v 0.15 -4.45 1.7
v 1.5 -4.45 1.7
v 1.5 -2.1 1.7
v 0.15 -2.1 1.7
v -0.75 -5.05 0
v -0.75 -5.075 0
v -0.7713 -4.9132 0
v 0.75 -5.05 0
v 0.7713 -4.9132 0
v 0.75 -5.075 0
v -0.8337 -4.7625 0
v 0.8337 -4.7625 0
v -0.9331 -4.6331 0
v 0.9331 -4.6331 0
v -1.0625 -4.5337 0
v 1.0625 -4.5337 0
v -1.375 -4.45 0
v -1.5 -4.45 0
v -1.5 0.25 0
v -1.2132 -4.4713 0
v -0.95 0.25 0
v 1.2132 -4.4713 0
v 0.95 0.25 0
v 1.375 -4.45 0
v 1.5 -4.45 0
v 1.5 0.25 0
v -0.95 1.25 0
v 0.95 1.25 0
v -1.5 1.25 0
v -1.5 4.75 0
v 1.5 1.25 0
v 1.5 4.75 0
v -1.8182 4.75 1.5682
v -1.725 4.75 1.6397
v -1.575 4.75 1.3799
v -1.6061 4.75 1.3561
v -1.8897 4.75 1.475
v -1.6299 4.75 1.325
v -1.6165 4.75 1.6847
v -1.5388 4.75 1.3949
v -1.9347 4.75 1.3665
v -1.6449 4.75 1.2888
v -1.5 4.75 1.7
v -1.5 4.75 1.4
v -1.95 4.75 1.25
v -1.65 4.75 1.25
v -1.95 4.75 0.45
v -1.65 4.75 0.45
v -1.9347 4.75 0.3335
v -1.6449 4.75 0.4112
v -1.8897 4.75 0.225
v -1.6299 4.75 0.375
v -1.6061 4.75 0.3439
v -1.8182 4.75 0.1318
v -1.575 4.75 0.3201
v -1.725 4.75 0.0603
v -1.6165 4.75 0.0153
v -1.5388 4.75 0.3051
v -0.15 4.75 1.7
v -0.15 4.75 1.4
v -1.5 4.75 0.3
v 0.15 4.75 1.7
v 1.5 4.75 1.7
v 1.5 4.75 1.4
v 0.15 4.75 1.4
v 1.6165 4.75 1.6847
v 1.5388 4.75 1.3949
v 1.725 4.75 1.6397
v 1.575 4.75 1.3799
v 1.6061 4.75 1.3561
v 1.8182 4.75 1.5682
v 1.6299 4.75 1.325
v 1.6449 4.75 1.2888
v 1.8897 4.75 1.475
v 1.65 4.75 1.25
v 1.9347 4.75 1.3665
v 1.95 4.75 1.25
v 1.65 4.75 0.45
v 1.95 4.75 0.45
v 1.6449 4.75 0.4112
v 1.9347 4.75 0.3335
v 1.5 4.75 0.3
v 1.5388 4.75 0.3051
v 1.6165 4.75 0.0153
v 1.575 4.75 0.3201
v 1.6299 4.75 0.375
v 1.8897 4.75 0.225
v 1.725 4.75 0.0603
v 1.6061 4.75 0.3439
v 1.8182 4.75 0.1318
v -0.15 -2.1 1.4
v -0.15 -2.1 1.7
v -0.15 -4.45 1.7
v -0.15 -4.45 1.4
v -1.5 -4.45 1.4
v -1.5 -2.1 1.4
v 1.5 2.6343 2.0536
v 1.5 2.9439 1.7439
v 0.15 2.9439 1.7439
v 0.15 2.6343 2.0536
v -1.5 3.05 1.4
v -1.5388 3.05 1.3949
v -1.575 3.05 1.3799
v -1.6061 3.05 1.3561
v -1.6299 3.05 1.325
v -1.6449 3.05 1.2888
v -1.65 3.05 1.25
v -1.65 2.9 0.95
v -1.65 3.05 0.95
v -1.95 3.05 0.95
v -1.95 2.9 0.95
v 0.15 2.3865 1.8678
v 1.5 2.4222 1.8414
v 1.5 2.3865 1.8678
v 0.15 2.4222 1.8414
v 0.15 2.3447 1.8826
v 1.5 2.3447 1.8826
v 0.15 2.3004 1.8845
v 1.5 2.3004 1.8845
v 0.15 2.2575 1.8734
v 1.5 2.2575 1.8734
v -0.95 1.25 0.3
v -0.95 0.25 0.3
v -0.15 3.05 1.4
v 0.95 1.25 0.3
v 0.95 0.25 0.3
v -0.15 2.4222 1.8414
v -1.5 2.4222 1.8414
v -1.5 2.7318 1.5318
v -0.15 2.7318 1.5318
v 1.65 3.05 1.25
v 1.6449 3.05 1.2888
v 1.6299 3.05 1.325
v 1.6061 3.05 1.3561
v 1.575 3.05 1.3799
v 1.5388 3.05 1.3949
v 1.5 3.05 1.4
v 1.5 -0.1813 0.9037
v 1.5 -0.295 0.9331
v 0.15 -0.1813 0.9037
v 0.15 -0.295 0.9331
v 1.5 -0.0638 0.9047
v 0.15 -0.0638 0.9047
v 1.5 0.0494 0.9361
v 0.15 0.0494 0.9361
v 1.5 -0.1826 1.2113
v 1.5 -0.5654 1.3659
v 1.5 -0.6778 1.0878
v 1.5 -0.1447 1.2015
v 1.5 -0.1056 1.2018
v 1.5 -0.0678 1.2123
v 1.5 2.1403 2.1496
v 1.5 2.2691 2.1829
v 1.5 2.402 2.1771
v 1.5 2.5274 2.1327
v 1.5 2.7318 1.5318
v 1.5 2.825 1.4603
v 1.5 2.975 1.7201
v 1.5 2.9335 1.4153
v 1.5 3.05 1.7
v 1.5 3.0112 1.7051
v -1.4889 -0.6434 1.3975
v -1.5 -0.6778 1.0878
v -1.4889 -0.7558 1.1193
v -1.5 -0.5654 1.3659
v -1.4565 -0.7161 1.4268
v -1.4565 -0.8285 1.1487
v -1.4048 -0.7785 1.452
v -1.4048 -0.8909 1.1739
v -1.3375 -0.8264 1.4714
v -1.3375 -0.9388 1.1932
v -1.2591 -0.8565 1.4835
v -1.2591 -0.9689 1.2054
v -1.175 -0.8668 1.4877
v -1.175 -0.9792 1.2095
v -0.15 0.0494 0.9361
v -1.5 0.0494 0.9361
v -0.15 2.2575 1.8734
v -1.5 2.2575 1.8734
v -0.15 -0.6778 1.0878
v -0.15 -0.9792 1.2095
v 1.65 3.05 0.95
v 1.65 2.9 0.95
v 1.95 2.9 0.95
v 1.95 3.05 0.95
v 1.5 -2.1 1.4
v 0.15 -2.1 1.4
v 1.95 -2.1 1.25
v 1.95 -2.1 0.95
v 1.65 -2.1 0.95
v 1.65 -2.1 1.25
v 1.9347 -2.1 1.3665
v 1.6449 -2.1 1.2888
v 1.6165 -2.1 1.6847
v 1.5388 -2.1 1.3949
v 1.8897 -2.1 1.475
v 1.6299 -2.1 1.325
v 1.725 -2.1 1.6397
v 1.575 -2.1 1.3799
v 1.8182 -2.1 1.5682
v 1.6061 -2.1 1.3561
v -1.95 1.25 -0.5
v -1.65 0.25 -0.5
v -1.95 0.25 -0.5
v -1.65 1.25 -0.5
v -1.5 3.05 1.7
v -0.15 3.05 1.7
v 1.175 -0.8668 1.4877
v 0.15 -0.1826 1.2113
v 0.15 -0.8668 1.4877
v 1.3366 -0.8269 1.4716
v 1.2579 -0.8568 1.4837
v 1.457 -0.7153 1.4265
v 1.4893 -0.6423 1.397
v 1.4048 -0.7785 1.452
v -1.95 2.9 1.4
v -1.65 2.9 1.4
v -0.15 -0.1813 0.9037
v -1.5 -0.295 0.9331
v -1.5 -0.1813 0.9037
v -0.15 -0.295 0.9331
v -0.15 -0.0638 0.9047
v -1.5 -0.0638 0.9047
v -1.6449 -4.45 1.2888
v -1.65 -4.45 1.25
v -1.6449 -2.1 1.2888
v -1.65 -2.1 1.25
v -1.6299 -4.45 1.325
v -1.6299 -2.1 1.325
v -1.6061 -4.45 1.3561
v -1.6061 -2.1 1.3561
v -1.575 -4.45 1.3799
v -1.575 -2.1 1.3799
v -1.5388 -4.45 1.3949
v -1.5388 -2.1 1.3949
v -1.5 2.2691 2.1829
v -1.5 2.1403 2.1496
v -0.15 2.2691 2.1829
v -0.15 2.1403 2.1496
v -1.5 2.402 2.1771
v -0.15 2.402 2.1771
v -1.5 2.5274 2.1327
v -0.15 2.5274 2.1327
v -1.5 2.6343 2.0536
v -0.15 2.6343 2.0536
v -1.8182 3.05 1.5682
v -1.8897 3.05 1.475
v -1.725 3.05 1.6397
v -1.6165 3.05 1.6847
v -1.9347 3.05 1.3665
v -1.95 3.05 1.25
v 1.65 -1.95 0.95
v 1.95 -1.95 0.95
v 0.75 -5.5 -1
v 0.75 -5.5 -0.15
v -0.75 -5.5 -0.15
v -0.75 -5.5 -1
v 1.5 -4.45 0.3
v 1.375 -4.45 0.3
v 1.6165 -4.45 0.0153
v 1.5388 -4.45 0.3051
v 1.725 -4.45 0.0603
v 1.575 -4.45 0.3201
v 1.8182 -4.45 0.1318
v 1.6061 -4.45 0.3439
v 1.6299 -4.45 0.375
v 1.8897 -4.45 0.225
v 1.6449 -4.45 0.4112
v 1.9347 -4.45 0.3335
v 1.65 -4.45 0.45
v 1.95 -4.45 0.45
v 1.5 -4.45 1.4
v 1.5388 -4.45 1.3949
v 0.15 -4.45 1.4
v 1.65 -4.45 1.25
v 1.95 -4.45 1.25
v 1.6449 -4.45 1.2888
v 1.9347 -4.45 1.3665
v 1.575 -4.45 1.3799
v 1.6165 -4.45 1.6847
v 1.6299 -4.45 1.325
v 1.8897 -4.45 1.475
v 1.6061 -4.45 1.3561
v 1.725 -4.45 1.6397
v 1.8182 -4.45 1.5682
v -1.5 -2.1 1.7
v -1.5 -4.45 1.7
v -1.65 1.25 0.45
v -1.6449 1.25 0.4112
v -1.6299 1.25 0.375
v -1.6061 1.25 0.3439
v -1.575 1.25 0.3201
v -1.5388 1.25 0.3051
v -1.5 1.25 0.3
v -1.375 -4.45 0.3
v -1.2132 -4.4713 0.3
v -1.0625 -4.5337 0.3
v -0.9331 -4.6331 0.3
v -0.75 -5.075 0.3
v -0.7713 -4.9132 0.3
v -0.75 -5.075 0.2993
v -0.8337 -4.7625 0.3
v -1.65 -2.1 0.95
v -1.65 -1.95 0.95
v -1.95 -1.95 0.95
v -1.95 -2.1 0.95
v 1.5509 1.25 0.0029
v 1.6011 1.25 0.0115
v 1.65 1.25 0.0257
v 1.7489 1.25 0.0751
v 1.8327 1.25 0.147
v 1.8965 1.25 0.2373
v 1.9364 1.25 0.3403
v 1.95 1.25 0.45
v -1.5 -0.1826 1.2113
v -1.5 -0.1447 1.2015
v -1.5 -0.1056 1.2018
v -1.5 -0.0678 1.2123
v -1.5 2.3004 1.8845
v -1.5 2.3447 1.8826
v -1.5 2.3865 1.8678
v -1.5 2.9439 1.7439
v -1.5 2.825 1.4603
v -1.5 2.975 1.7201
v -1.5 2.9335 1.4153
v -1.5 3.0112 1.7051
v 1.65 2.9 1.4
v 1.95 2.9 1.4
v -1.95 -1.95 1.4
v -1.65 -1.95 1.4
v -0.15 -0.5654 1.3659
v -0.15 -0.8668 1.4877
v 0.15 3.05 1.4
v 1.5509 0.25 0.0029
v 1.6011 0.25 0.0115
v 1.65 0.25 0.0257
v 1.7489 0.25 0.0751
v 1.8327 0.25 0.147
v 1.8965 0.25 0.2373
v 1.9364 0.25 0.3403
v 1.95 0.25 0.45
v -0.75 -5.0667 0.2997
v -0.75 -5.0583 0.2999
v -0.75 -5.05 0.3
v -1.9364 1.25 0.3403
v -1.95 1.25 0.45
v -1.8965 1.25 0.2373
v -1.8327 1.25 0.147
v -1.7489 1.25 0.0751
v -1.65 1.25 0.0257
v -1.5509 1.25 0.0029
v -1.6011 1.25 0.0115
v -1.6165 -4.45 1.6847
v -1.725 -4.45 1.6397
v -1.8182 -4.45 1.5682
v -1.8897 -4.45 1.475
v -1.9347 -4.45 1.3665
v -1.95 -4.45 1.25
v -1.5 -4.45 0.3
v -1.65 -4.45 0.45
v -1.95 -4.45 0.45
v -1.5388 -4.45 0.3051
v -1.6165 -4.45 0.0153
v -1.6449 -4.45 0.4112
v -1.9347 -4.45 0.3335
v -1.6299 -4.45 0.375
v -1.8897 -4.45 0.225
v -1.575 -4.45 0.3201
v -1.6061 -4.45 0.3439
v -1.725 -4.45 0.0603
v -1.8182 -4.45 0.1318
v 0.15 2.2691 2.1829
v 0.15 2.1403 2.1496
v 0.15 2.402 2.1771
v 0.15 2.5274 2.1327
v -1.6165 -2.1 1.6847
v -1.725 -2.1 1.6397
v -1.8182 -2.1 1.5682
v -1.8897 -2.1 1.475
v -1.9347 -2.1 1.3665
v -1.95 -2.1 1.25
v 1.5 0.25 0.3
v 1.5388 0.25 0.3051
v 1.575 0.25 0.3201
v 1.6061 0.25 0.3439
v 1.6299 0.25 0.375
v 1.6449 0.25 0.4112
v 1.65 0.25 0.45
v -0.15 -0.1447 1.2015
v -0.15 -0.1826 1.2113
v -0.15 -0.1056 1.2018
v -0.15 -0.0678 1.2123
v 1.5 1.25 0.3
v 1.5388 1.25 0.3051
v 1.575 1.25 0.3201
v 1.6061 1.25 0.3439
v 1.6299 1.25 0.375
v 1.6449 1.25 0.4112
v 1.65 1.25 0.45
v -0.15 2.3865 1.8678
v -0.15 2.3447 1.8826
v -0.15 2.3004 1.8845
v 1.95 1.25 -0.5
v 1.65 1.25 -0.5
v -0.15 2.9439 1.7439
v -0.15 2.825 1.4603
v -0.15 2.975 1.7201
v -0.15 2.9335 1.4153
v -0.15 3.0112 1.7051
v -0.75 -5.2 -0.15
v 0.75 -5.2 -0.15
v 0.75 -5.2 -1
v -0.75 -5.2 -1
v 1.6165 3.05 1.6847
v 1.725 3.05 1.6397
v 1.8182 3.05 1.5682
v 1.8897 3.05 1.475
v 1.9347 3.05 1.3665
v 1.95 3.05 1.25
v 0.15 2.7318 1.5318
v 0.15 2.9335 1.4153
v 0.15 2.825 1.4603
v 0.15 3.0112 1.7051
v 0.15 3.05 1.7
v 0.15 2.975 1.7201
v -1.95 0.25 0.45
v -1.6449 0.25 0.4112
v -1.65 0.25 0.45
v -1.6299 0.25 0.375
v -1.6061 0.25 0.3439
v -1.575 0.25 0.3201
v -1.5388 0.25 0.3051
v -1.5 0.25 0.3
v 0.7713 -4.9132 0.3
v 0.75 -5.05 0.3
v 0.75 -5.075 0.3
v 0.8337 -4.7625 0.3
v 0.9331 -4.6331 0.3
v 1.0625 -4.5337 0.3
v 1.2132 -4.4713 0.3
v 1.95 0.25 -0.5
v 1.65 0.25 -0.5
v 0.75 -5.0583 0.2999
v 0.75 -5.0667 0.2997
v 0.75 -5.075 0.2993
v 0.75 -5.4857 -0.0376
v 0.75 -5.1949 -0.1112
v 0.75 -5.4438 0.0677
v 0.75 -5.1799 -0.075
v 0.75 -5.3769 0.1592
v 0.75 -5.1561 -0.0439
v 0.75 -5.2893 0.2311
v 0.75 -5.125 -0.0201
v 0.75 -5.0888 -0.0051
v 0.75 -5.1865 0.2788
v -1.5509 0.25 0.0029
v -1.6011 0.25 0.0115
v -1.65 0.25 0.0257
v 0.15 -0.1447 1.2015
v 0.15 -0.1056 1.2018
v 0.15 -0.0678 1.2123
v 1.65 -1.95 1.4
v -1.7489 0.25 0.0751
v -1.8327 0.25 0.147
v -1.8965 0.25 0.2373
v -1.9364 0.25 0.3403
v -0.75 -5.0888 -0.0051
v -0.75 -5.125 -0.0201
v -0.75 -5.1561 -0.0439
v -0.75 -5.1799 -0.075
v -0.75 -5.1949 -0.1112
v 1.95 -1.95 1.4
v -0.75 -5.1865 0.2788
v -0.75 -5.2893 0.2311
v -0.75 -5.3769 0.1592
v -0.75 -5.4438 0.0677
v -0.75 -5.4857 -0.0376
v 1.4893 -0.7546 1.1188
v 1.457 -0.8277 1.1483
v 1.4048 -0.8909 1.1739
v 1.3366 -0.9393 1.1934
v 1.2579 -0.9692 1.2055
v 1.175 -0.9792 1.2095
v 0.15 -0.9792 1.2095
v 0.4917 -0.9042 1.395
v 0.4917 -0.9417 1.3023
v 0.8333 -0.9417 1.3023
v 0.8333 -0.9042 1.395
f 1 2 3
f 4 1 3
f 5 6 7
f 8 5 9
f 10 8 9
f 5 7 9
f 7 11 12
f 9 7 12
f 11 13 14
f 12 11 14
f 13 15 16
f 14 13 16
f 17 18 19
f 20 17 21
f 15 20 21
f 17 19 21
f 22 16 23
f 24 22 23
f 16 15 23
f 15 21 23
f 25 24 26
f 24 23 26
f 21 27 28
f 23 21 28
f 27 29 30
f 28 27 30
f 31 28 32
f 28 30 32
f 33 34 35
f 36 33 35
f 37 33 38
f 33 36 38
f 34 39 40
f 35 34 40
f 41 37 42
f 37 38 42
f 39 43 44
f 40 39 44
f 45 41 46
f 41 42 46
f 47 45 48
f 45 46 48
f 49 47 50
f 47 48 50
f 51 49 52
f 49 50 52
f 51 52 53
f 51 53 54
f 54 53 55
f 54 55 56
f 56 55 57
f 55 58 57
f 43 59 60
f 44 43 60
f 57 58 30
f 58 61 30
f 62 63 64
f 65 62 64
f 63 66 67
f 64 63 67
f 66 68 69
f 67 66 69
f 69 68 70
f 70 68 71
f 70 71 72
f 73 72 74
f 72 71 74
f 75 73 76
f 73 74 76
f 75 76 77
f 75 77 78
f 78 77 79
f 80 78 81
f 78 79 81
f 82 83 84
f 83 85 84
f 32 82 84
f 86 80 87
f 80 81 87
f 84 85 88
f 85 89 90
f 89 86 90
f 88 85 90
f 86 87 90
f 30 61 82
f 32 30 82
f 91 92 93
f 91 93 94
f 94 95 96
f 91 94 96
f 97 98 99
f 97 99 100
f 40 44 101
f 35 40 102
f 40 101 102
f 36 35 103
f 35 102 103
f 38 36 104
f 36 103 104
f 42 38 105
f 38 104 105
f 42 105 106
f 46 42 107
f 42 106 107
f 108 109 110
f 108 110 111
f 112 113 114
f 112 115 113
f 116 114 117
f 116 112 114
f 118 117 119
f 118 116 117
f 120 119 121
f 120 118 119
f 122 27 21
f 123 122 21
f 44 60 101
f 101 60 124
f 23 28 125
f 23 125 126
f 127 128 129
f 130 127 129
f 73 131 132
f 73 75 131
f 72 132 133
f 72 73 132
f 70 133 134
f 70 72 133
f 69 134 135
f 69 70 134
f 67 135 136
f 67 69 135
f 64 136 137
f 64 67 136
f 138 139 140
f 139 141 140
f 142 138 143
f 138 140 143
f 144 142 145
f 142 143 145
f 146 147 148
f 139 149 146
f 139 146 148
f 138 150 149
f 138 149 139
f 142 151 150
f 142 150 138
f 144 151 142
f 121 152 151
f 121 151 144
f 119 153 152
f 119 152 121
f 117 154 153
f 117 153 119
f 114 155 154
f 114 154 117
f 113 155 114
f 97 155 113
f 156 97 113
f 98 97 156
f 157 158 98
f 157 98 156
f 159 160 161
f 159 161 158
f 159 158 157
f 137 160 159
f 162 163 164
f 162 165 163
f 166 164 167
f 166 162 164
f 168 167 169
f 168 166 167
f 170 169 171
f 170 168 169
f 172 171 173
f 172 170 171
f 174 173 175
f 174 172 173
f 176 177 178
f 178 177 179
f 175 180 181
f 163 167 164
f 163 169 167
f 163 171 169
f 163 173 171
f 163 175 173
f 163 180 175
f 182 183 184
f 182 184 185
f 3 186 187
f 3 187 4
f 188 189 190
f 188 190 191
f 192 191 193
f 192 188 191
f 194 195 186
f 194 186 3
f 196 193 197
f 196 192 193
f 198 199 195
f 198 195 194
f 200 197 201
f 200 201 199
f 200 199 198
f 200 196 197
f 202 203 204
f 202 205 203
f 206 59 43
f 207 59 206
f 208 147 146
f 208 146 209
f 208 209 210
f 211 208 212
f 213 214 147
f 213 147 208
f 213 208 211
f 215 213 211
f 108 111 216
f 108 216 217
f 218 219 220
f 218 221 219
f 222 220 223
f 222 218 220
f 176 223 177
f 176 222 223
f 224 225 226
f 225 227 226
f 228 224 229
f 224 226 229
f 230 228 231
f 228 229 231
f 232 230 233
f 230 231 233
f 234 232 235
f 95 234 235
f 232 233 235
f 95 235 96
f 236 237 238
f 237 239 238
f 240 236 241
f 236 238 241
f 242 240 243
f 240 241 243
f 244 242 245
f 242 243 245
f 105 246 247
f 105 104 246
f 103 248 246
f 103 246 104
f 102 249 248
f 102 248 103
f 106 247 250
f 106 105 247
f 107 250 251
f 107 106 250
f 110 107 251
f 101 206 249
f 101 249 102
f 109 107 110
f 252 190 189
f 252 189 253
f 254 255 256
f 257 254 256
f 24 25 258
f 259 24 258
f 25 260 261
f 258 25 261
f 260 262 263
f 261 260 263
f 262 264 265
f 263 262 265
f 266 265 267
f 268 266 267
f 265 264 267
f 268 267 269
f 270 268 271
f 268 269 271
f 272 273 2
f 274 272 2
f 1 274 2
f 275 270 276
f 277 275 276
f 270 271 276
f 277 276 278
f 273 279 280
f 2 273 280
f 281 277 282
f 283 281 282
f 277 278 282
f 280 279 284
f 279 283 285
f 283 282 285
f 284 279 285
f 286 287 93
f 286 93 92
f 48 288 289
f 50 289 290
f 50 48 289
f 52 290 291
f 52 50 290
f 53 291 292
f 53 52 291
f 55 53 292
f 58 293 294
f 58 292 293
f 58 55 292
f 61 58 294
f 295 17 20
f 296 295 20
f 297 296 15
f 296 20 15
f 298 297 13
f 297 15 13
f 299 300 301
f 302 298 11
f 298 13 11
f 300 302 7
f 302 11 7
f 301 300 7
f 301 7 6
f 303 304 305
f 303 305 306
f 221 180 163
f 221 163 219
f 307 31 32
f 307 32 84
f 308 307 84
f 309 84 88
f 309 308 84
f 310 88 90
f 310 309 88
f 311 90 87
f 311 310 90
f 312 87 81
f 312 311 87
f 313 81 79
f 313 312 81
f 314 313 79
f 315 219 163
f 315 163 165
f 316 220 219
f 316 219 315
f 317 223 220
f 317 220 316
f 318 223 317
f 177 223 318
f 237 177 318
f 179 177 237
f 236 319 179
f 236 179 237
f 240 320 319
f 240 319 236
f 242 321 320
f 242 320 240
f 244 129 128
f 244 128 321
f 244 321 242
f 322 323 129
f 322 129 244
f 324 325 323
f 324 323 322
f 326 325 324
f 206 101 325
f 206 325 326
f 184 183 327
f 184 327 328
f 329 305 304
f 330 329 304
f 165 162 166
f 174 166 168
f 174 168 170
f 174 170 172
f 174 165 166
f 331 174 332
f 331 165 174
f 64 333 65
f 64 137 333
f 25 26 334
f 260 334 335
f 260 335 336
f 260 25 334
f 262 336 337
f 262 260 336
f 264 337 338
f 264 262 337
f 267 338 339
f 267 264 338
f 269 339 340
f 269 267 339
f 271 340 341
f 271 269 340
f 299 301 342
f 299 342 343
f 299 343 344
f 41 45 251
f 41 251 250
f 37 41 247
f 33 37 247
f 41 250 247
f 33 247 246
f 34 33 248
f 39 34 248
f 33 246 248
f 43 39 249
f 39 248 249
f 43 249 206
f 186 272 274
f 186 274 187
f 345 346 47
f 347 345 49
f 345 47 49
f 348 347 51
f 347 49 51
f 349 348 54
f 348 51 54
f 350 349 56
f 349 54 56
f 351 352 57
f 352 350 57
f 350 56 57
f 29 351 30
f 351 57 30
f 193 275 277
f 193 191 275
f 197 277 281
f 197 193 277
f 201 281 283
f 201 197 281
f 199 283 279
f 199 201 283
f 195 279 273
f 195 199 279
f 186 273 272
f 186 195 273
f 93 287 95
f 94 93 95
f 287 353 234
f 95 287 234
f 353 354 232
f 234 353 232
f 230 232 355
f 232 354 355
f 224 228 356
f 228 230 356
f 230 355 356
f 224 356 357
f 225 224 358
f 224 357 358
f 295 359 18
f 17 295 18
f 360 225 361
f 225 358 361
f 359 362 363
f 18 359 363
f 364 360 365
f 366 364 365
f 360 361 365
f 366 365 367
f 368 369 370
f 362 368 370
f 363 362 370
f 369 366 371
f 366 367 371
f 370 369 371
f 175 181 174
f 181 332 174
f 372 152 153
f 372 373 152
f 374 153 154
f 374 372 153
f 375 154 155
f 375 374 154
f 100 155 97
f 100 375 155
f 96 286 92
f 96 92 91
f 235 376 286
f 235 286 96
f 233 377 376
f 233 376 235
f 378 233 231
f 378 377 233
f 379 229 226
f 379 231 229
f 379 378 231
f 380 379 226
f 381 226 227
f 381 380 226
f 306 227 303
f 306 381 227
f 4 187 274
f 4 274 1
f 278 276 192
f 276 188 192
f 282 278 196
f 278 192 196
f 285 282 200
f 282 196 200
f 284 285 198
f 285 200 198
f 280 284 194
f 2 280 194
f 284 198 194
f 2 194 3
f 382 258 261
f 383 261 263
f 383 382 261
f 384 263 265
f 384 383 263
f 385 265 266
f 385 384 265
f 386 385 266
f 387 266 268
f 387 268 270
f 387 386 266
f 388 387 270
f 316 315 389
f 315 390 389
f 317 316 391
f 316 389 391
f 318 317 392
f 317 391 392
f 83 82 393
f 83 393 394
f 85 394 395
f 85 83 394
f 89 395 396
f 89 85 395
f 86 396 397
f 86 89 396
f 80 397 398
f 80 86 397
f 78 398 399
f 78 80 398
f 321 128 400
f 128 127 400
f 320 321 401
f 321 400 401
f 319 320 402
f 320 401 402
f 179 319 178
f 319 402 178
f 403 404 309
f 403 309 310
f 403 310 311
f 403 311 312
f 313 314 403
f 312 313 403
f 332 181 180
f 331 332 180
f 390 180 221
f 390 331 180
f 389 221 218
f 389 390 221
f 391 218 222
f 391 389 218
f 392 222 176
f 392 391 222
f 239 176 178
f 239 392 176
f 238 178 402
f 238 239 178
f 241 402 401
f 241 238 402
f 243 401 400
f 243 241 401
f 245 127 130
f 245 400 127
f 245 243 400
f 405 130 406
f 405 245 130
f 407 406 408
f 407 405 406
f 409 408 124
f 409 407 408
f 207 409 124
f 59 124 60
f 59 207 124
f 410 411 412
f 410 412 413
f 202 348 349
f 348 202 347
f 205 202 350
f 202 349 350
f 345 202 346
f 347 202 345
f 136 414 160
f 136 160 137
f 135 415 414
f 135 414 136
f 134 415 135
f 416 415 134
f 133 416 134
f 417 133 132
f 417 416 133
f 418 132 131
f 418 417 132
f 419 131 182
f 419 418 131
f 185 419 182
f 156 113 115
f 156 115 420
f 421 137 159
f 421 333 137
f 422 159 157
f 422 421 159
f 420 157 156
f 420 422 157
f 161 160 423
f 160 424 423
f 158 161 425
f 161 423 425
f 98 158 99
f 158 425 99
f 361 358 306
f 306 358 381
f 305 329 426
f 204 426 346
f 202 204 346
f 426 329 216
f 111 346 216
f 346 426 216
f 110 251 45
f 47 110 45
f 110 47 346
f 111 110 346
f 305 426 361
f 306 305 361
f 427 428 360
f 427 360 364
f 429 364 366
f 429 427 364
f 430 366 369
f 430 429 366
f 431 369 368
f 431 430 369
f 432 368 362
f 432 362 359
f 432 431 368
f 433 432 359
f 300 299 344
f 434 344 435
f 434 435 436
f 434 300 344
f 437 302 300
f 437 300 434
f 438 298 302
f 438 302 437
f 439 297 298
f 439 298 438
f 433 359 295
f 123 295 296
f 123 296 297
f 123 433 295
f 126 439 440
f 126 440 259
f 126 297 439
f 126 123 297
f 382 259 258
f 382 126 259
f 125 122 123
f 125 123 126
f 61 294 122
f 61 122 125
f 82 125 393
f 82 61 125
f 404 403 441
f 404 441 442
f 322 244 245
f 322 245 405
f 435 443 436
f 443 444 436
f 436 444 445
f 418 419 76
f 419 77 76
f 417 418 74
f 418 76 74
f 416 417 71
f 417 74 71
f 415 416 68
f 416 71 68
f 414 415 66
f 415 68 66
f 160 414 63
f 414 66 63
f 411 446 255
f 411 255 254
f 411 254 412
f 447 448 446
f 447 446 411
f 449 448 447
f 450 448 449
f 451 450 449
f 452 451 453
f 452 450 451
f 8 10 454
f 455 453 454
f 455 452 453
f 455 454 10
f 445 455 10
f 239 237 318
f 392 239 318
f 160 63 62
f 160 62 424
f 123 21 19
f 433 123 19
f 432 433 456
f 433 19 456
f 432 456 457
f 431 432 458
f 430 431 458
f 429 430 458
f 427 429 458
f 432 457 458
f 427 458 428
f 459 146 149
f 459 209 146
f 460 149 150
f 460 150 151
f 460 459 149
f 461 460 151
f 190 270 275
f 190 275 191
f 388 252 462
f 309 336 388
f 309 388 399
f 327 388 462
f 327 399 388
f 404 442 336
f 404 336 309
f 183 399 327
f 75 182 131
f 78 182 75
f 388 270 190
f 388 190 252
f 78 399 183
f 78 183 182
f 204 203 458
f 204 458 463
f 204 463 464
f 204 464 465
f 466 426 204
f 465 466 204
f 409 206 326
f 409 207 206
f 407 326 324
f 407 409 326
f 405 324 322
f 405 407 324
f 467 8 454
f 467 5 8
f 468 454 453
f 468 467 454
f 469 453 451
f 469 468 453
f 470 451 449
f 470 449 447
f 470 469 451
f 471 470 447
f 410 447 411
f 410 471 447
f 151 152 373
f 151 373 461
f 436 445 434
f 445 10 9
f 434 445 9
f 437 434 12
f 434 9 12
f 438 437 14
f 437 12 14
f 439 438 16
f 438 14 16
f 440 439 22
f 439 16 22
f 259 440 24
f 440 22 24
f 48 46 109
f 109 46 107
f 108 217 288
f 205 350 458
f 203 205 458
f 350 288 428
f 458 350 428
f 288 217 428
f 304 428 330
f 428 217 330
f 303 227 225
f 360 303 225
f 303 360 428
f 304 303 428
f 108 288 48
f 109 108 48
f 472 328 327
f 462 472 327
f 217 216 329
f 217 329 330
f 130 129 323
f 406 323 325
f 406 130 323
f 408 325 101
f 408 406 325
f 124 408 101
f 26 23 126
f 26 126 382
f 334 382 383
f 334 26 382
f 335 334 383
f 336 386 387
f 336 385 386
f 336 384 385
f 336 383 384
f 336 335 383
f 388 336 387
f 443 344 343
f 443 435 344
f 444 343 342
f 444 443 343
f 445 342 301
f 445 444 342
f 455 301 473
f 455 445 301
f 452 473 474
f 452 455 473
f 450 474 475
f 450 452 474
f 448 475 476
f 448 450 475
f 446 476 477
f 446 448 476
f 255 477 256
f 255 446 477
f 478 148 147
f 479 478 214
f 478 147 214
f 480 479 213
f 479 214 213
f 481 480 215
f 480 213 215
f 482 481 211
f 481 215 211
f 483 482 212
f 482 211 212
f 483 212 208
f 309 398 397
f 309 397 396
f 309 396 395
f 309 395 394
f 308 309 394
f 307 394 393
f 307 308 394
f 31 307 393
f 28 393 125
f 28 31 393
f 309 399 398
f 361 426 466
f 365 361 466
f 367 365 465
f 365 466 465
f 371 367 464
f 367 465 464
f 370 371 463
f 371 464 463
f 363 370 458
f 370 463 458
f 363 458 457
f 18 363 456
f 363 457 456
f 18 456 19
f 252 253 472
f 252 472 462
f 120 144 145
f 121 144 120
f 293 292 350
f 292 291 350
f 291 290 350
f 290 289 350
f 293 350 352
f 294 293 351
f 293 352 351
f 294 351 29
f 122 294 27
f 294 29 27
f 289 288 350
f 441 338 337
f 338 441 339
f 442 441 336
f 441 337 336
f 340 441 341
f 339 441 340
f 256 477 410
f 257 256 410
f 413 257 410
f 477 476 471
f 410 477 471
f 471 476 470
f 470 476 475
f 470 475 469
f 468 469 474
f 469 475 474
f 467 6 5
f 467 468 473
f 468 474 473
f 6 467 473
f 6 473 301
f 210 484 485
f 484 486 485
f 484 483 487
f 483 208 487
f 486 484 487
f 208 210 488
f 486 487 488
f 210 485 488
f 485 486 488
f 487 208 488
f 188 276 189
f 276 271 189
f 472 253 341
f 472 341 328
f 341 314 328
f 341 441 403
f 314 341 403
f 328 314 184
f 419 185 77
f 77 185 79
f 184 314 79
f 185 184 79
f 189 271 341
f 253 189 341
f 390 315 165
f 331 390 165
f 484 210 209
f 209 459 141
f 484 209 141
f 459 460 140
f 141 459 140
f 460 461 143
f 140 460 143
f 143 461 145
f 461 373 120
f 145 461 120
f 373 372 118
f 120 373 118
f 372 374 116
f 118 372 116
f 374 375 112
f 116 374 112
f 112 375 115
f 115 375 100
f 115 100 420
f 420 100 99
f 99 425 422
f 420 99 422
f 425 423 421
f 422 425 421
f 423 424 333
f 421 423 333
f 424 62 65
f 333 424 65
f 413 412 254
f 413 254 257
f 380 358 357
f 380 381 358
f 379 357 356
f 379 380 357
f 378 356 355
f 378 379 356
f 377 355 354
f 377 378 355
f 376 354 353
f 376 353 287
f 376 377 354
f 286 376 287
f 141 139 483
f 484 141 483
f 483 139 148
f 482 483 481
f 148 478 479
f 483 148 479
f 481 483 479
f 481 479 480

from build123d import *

# Parameters (mm, degrees)
BOSS_EXTRUDE1_DEPTH   = 1.35
BOSS_EXTRUDE1_START   = -0.15
BOSS_EXTRUDE1_2_DEPTH = 0.15
SKETCH2_W             = 0.3000000000000001
SKETCH2_H             = 9.200000000000003
BOSS_EXTRUDE2_DEPTH   = 3.1499999999999995
BOSS_EXTRUDE3_DEPTH   = 0.29999999999999993
BOSS_EXTRUDE4_DEPTH   = 0.30000000000000016
CUT_EXTRUDE1_DEPTH    = 0.15000000000000127
BOSS_EXTRUDE5_DEPTH   = 0.15000000000000127
BOSS_EXTRUDE6_DEPTH   = 1.3500000000000003
CUT_EXTRUDE2_DEPTH    = 0.3000000000000021
CUT_EXTRUDE3_DEPTH    = 0.29999999999999927
CUT_EXTRUDE4_DEPTH    = 0.15000000000000385
CUT_EXTRUDE5_DEPTH    = 0.1500000000000002
BOSS_EXTRUDE7_DEPTH   = 0.32500023179600646
SKETCH13_W            = 2.4
SKETCH13_H            = 0.30000000000000016
BOSS_EXTRUDE8_DEPTH   = 0.7500000000000016
BOSS_EXTRUDE9_DEPTH   = 0.3000000000000004
SKETCH15_W            = 0.30000000000000016
SKETCH15_H            = 0.6000000000000005
BOSS_EXTRUDE10_DEPTH  = 0.3000000000000004
BOSS_EXTRUDE11_DEPTH  = 1
SKETCH17_W            = 0.30000000000000004
SKETCH17_H            = 2.350000000000001
BOSS_EXTRUDE12_DEPTH  = 0.7499999999999998
SKETCH18_W            = 0.30000000000000004
SKETCH18_H            = 2.350000000000001
BOSS_EXTRUDE13_DEPTH  = 1.5000000000000007
BOSS_EXTRUDE14_DEPTH  = 0.4499999999999999
BOSS_EXTRUDE15_DEPTH  = 1.0499999999999998
SKETCH21_W            = 1.5
SKETCH21_H            = 0.2999999999999998
BOSS_EXTRUDE16_DEPTH  = 1
BOSS_EXTRUDE17_DEPTH  = 0.7499999999999999
SKETCH23_W            = 0.30000000000000004
SKETCH23_H            = 2.350000000000001
BOSS_EXTRUDE18_DEPTH  = 1.5000000000000004
SKETCH24_W            = 0.30000000000000004
SKETCH24_H            = 4.8500000000000005
BOSS_EXTRUDE19_DEPTH  = 0.4499999999999999
DRAFT1_START          = -1.5
DRAFT1_DEPTH          = 1.35
DRAFT2_START          = -1.5
DRAFT2_DEPTH          = 1.35
DRAFT3_ANGLE          = 45.00000000000445
DRAFT4_ANGLE          = 44.99999999999104
FILLET1_R             = 0.15000000000000022
FILLET2_R             = 0.3250000000000042
FILLET3_R             = 0.45
FILLET4_DEPTH         = 0.3
FILLET4_START         = 2.200609665
FILLET4_2_DEPTH       = 0.3
CUT_EXTRUDE6_DEPTH    = 10
CUT_EXTRUDE7_DEPTH    = 0.5
BOSS_EXTRUDE20_DEPTH  = 1


with BuildPart() as part:
    # Boss-Extrude1: read off the stored shape, not the designer's step
    # Boss-Extrude1 outline → Boss-Extrude1 (new body)
    with BuildSketch(Plane(origin=(-1.4999999999999991, 0, 0), x_dir=(0, 0, -1), z_dir=(1, 0, 0))):
        Polygon((-3.114213562, 4.812132034), (-1.7, 4.812132034), (-1.7, 2.987867966), (-2.509359079, 2.987867966), (-1.188010503, -0.125034203), (-1.365948548, -0.565446319), (-1.087793392, -0.677828297), (-0.863305207, -0.122200542), (-2.130703998, 2.863603897), (-1.4, 2.863603897), (-1.4, 4.936396103), (-2.989949494, 4.936396103), align=None)
    extrude(amount=BOSS_EXTRUDE1_DEPTH)

    # Boss-Extrude1 2 outline → Boss-Extrude1 2 (add)
    with BuildSketch(Plane(origin=(-1.4999999999999991, 0, 0), x_dir=(0, 0, -1), z_dir=(1, 0, 0)).offset(BOSS_EXTRUDE1_START)):
        Polygon((-3.114213562, 4.812132034), (-1.7, 4.812132034), (-1.7, 3.05), (-0.95, 3.05), (-0.95, -4.45), (0, -4.45), (0, 4.75), (-1.4, 4.75), (-1.4, 4.936396103), (-2.989949494, 4.936396103), align=None)
    extrude(amount=BOSS_EXTRUDE1_2_DEPTH)

    # Sketch2 → Boss-Extrude2 (add)
    with BuildSketch(Plane(origin=(-1.4999999999999991, 0, 0), x_dir=(0, 0, -1), z_dir=(1, 0, 0))):
        with Locations((-0.15000000000000005, 0.1499999999999999)):
            Rectangle(SKETCH2_W, SKETCH2_H)
    extrude(amount=BOSS_EXTRUDE2_DEPTH)

    # Sketch3 → Boss-Extrude3 (add)
    with BuildSketch(Plane(origin=(1.6500000000000004, 0, 0), x_dir=(0, 0, -1), z_dir=(1, 0, 0))):
        Polygon((-0.9500000000000003, -4.450000000000001), (-0.9500000000000003, 3.0500000000000007), (-1.7000000000000002, 3.0500000000000007), (-1.7000000000000002, 4.812132034356001), (-3.1142135623726666, 4.812132034356001), (-2.989949493660945, 4.936396103067781), (-1.4000000000000001, 4.936396103067781), (-1.4000000000000035, 4.750000000000001), (0, 4.750000000000001), (0, -4.450000000000001), align=None)
    extrude(amount=BOSS_EXTRUDE3_DEPTH)

    # Sketch4 → Boss-Extrude4 (add)
    with BuildSketch(Plane.ZY.offset(1.6500000000000001)):
        Polygon((0.9500000000000002, -4.450000000000001), (0, -4.450000000000001), (0, 4.749999999999999), (1.4000000000000037, 4.750000000000001), (1.4000000000000001, 4.936396103067801), (2.9899494936609243, 4.936396103067802), (3.1142135623726666, 4.812132034356001), (1.7000000000000002, 4.812132034356001), (1.7000000000000002, 3.0500000000000007), (0.9500000000000003, 3.0500000000000007), align=None)
    extrude(amount=BOSS_EXTRUDE4_DEPTH)

    # Sketch5 → Cut-Extrude1 (cut)
    with BuildSketch(Plane(origin=(-1.4999999999999991, 0, 0), x_dir=(0, 0, -1), z_dir=(1, 0, 0))):
        Polygon((-0.9500000000000003, 3.0500000000000007), (-0.9500000000000002, -4.450000000000001), (-0.30000000000000004, -4.450000000000001), (-0.30000000000000016, 4.750000000000001), (-1.4000000000000037, 4.750000000000001), (-1.4000000000000001, 3.0500000000000007), align=None)
    extrude(amount=-CUT_EXTRUDE1_DEPTH, mode=Mode.SUBTRACT)

    # Sketch6 → Boss-Extrude5 (add)
    with BuildSketch(Plane.ZY.offset(-1.6500000000000004)):
        Polygon((1.7000000000000002, 4.812132034356001), (1.7000000000000002, 3.0500000000000007), (1.4000000000000197, 3.0500000000000007), (1.4000000000000001, 4.936396103067882), (2.9899494936608453, 4.936396103067881), (3.1142135623726666, 4.812132034356001), align=None)
    extrude(amount=BOSS_EXTRUDE5_DEPTH)

    # Sketch7 → Boss-Extrude6 (add)
    with BuildSketch(Plane.ZY.offset(-1.4999999999999991)):
        with BuildLine():
            Line((1.7, 2.9878679656439875), (2.5093590788271998, 2.9878679656439675))
            Line((2.5093590788271998, 2.9878679656439675), (2.1495825231129353, 2.1402875156965857))
            add(Edge.make_bspline(
                [(1.2122874229840004, -0.06784136341720032), (1.52471912302698, 0.6682015962873946), (1.8371508230699576, 1.4042445559919898), (2.1495825231129353, 2.1402875156965857)],
                knots=[0, 0, 0, 0, 1, 1, 1, 1], degree=3))
            Line((1.2122874229840004, -0.06784136341720032), (1.188010503084729, -0.12503420259681308))
            Line((1.188010503084729, -0.12503420259681308), (1.2112855728167975, -0.18264202170300106))
            add(Edge.make_bspline(
                [(1.4876957778174003, -0.8667812862502003), (1.3955590428172002, -0.638734864734467), (1.3034223078170002, -0.4106884432187335), (1.2112855728167975, -0.18264202170300106)],
                knots=[0, 0, 0, 0, 1, 1, 1, 1], degree=3))
            add(Edge.make_bspline(
                [(1.2095406214473998, -0.9791632642749003), (1.3022590069040665, -0.9417026049333337), (1.3949773923607334, -0.9042419455917671), (1.4876957778174003, -0.8667812862502003)],
                knots=[0, 0, 0, 0, 1, 1, 1, 1], degree=3))
            add(Edge.make_bspline(
                [(0.9331304164468003, -0.2950239997277002), (1.0252671514470002, -0.5230704212434336), (1.1174038864472, -0.7511168427591669), (1.2095406214473998, -0.9791632642749003)],
                knots=[0, 0, 0, 0, 1, 1, 1, 1], degree=3))
            Line((0.9331304164468003, -0.2950239997277002), (0.8633052072505193, -0.12220054240891351))
            Line((0.8633052072505193, -0.12220054240891351), (0.9361359669482366, 0.04937797512958447))
            add(Edge.make_bspline(
                [(1.8734310670777075, 2.2575068542431853), (1.5609993670345503, 1.5214638945386514), (1.2485676669913934, 0.7854209348341182), (0.9361359669482366, 0.04937797512958447)],
                knots=[0, 0, 0, 0, 1, 1, 1, 1], degree=3))
            Line((1.8734310670777075, 2.2575068542431853), (2.1307039978783813, 2.8636038969319726))
            Line((2.1307039978783813, 2.8636038969319726), (1.400000000000637, 2.863603896931973))
            Line((1.400000000000637, 2.863603896931973), (1.400000000000637, 4.936396103067612))
            Line((1.400000000000637, 4.936396103067612), (2.9899494936614825, 4.936396103067612))
            Line((2.9899494936614825, 4.936396103067612), (3.1142135623733327, 4.812132034355761))
            Line((3.1142135623733327, 4.812132034355761), (1.6999999999999997, 4.812132034355761))
            Line((1.6999999999999997, 4.812132034355761), (1.7, 2.9878679656439875))
        make_face()
    extrude(amount=BOSS_EXTRUDE6_DEPTH)

    # Sketch8 → Cut-Extrude2 (cut)
    with BuildSketch(Plane(origin=(1.9500000000000004, 0, 0), x_dir=(0, 0, -1), z_dir=(1, 0, 0))):
        Polygon((-1.7000000000000002, 4.750000000000001), (-1.4000000000000035, 4.750000000000001), (-1.4000000000000001, 4.936396103067781), (-2.989949493660945, 4.936396103067781), (-3.1142135623726666, 4.812132034356001), (-1.7000000000000002, 4.812132034356001), align=None)
    extrude(amount=-CUT_EXTRUDE2_DEPTH, mode=Mode.SUBTRACT)

    # Sketch9 → Cut-Extrude3 (cut)
    with BuildSketch(Plane.ZY.offset(1.9500000000000004)):
        Polygon((1.7000000000000035, 4.750000000000001), (1.7000000000000002, 4.812132034356001), (3.1142135623726666, 4.812132034356001), (2.9899494936609243, 4.936396103067802), (1.4000000000000001, 4.936396103067801), (1.4000000000000037, 4.750000000000001), align=None)
    extrude(amount=-CUT_EXTRUDE3_DEPTH, mode=Mode.SUBTRACT)

    # Sketch10 → Cut-Extrude4 (cut)
    with BuildSketch(Plane(origin=(1.6499999999999984, 0, 0), x_dir=(-7.23e-15, 0, -1), z_dir=(1, 0, -7.23e-15))):
        Polygon((-1.7000000000000153, 4.750000000000001), (-1.4000000000000155, 4.750000000000001), (-1.4000000000000121, 4.936396103067781), (-2.989949493660957, 4.936396103067781), (-3.1142135623726785, 4.812132034356001), (-1.700000000000012, 4.812132034356001), align=None)
    extrude(amount=-CUT_EXTRUDE4_DEPTH, mode=Mode.SUBTRACT)

    # Sketch11 → Cut-Extrude5 (cut)
    with BuildSketch(Plane.ZY.offset(1.650000000000001)):
        Polygon((1.700000000000013, 4.750000000000018), (1.7000000000000097, 4.8121320343560186), (3.114213562372676, 4.8121320343560186), (2.9899494936609337, 4.936396103067819), (1.4000000000000097, 4.9363961030678185), (1.4000000000000132, 4.750000000000018), align=None)
    extrude(amount=-CUT_EXTRUDE5_DEPTH, mode=Mode.SUBTRACT)

    # Sketch12 → Boss-Extrude7 (add)
    with BuildSketch(Plane(origin=(0, -0.9605309765461568, 0.3880797052513418), x_dir=(1, 0, 0), z_dir=(0, -0.9271838545669052, 0.37460659341562025))):
        Polygon((-0.15000000000000005, 1.0546655208211408), (-0.15000000000000005, 0.7546655208212015), (-1.5, 0.7546655208212013), (-1.5000000000000002, 1.0546655208211408), align=None)
    extrude(amount=BOSS_EXTRUDE7_DEPTH)

    # Sketch13 → Boss-Extrude8 (add)
    with BuildSketch(Plane(origin=(0, 4.750000000000001, 0), x_dir=(-1, 0, 0), z_dir=(0, 1, 0))):
        with Locations((0, 0.15000000000000008)):
            Rectangle(SKETCH13_W, SKETCH13_H)
    extrude(amount=BOSS_EXTRUDE8_DEPTH)

    # Sketch14 → Boss-Extrude9 (add)
    with BuildSketch(Plane.ZY.offset(1.2)):
        Polygon((0, 5.500000000000001), (0.30000000000000016, 5.500000000000001), (0.30000000000000016, 4.900000000000001), (0, 4.9), align=None)
    extrude(amount=BOSS_EXTRUDE9_DEPTH)

    # Sketch15 → Boss-Extrude10 (add)
    with BuildSketch(Plane(origin=(1.2, 0, 0), x_dir=(0, 0, -1), z_dir=(1, 0, 0))):
        with Locations((-0.15000000000000008, 5.200000000000001)):
            Rectangle(SKETCH15_W, SKETCH15_H)
    extrude(amount=BOSS_EXTRUDE10_DEPTH)

    # Sketch16 → Boss-Extrude11 (add)
    with BuildSketch(Plane(origin=(0, 0, 0), x_dir=(-1, 0, 0), z_dir=(0, 0, -1))):
        Polygon((1.4999999999999998, 5.200000000000001), (-1.4999999999999996, 5.200000000000001), (-1.5000000000000002, 5.500000000000001), (1.5000000000000002, 5.500000000000001), align=None)
    extrude(amount=BOSS_EXTRUDE11_DEPTH)

    # Sketch17 → Boss-Extrude12 (add)
    with BuildSketch(Plane.XY.offset(0.9500000000000003)):
        with Locations((1.8000000000000003, -3.2750000000000004)):
            Rectangle(SKETCH17_W, SKETCH17_H)
    extrude(amount=BOSS_EXTRUDE12_DEPTH)

    # Sketch18 → Boss-Extrude13 (add)
    with BuildSketch(Plane.ZY.offset(-1.6500000000000004)):
        with Locations((1.5500000000000003, -3.2750000000000004)):
            Rectangle(SKETCH18_W, SKETCH18_H)
    extrude(amount=BOSS_EXTRUDE13_DEPTH)

    # Sketch19 → Boss-Extrude14 (add)
    with BuildSketch(Plane.XY.offset(0.9500000000000003)):
        Polygon((1.6500000000000004, -1.9500000000000004), (1.6500000000000004, 2.9), (1.9500000000000004, 2.9000000000000004), (1.9500000000000004, -1.9500000000000002), align=None)
    extrude(amount=BOSS_EXTRUDE14_DEPTH)

    # Sketch20 → Boss-Extrude15 (add)
    with BuildSketch(Plane.XZ.offset(4.450000000000001)):
        Polygon((-0.7500000000000001, 0), (-0.7500000000000001, 0.30000000000000016), (0.7500000000000001, 0.30000000000000004), (0.7500000000000001, 0), align=None)
    extrude(amount=BOSS_EXTRUDE15_DEPTH)

    # Sketch21 → Boss-Extrude16 (add)
    with BuildSketch(Plane(origin=(0, 0, 0), x_dir=(-1, 0, 0), z_dir=(0, 0, -1))):
        with Locations((0, -5.350000000000001)):
            Rectangle(SKETCH21_W, SKETCH21_H)
    extrude(amount=BOSS_EXTRUDE16_DEPTH)

    # Sketch22 → Boss-Extrude17 (add)
    with BuildSketch(Plane.XY.offset(0.9500000000000003)):
        Polygon((-1.6500000000000001, -4.450000000000001), (-1.9500000000000004, -4.450000000000001), (-1.9500000000000004, -2.1), (-1.6500000000000004, -2.1), align=None)
    extrude(amount=BOSS_EXTRUDE17_DEPTH)

    # Sketch23 → Boss-Extrude18 (add)
    with BuildSketch(Plane(origin=(-1.6500000000000004, 0, 0), x_dir=(0, 0, -1), z_dir=(1, 0, 0))):
        with Locations((-1.5500000000000003, -3.2750000000000004)):
            Rectangle(SKETCH23_W, SKETCH23_H)
    extrude(amount=BOSS_EXTRUDE18_DEPTH)

    # Sketch24 → Boss-Extrude19 (add)
    with BuildSketch(Plane.XY.offset(0.9500000000000003)):
        with Locations((-1.8000000000000003, 0.475)):
            Rectangle(SKETCH24_W, SKETCH24_H)
    extrude(amount=BOSS_EXTRUDE19_DEPTH)

    # Draft1: read off the stored shape, not the designer's step
    # Draft1 outline → Draft1 (add)
    with BuildSketch(Plane.YZ.offset(DRAFT1_START)):
        Polygon((4.936396103, 2.989949494), (4.936396103, 1.4), (5.73137085, 2.194974747), align=None)
        Polygon((2.863603897, 2.130703998), (2.350640109, 1.912963788), (2.863603897, 1.4), align=None)
    extrude(amount=DRAFT1_DEPTH)

    # Draft2: read off the stored shape, not the designer's step
    # Draft2 outline → Draft2 (cut)
    with BuildSketch(Plane.YZ.offset(DRAFT2_START)):
        Polygon((4.812132034, 1.7), (5.519238816, 2.407106781), (4.812132034, 3.114213562), align=None)
        Polygon((2.419687279, 2.268180686), (2.987867966, 1.7), (2.987867966, 2.509359079), align=None)
    extrude(amount=DRAFT2_DEPTH, mode=Mode.SUBTRACT)

    # Draft3
    draft3_faces = [part.faces().sort_by_distance(p)[0] for p in [
        (0.824999999999999, 2.863603896931973, 1.7653519989395092),
        (0.8250000000000098, 4.936396103067781, 2.194974746830841),
    ]]
    draft(draft3_faces, Plane(origin=(1.9500000000000004, 4.936396103067781, 1.4000000000000001), x_dir=(0, -1, 1.745e-14), z_dir=(0, -1.745e-14, -1)), DRAFT3_ANGLE)

    # Draft4
    draft4_faces = [part.faces().sort_by_distance(p)[0] for p in [
        (0.8249999999999654, 4.812132034356001, 2.4071067811865423),
        (0.824999999999999, 2.9878679656439773, 2.1046795394136),
    ]]
    draft(draft4_faces, Plane(origin=(1.9500000000000004, 3.0500000000000007, 1.7000000000000002), x_dir=(1, 0, 0), z_dir=(0, 0, 1)), DRAFT4_ANGLE)

    # Fillet1
    fillet1_edges = [part.edges().sort_by_distance(p)[0] for p in [
        (-0.82500000000003, 4.812132034, 1.7),
        (-0.825, 2.350640109, 1.912963788),
        (-0.8249999999999991, 2.987867966, 1.7),
        (-0.8249999999999991, -0.125034203, 1.188010503),
        (1.6500000000000004, 0.15000000000000036, 0.3000000000000001),
        (-1.6500000000000004, 3.900000000000001, 1.400000000000002),
        (-1.6500000000000004, 0.15000000000000036, 0.3000000000000001),
        (1.6500000000000004, 3.900000000000001, 1.4000000000000108),
        (0.824999999999999, 2.9878679656439875, 1.7000000000000002),
        (0.824999999999999, 2.350640108760132, 1.9129637881718162),
        (0.824999999999999, -0.12503420259681308, 1.188010503084729),
        (0.8250000000000027, 4.812132034356001, 1.7000000000000002),
        (-2.2e-16, 5.200000000000001, 0),
        (1.6500000000000004, -3.2750000000000004, 1.4000000000000001),
        (1.1e-16, -5.200000000000001, 0),
        (-1.6500000000000004, -3.2750000000000004, 1.4000000000000001),
    ]]
    fillet(fillet1_edges, radius=FILLET1_R)

    # Fillet2
    fillet2_edges = [part.edges().sort_by_distance(p)[0] for p in [
        (-1.5, -0.922972275262529, 1.3486181996324813),
        (1.4999999999999991, -0.9229722752625503, 1.3486181996324),
    ]]
    fillet(fillet2_edges, radius=FILLET2_R)

    # Fillet3
    fillet3_edges = [part.edges().sort_by_distance(p)[0] for p in [
        (-0.8249999999999991, -0.122200542, 0.863305207),
        (-0.8249999999999991, 2.863603897, 1.4),
        (-0.825, 2.419687279, 2.268180686),
        (1.9500000000000002, 0.14999999999999947, 0),
        (-1.9500000000000002, 3.900000000000001, 1.7000000000000002),
        (-1.9500000000000002, 0.14999999999999858, 0),
        (0.824999999999999, 2.863603896931973, 1.4000000000000372),
        (0.824999999999999, -0.12220054240891351, 0.8633052072505193),
        (0.824999999999999, 2.4196872792485182, 2.268180686395647),
        (1.9500000000000002, 3.900000000000001, 1.7000000000000002),
        (0.8250000000000017, 4.936396103067781, 1.4000000000000001),
        (-0.8250000000000298, 4.936396103, 1.4),
        (0, 5.500000000000001, 0.30000000000000016),
        (1.9500000000000004, -3.2750000000000004, 1.7000000000000002),
        (0, -5.500000000000001, 0.3000000000000001),
        (-1.9500000000000004, -3.2750000000000004, 1.7000000000000002),
    ]]
    fillet(fillet3_edges, radius=FILLET3_R)

    # Fillet4: read off the stored shape, not the designer's step
    # Fillet4 outline → Fillet4 (add)
    with BuildSketch(Plane.XY):
        with BuildLine():
            Line((-0.75, -4.45), (-1.375, -4.45))
            ThreePointArc((-1.375, -4.45), (-0.933058262, -4.633058262), (-0.75, -5.075))
            Line((-0.75, -5.075), (-0.75, -4.45))
        make_face()
        with BuildLine():
            ThreePointArc((0.75, -5.075), (0.933058262, -4.633058262), (1.375, -4.45))
            Line((1.375, -4.45), (0.75, -4.45))
            Line((0.75, -4.45), (0.75, -5.075))
        make_face()
    extrude(amount=FILLET4_DEPTH)

    # Fillet4 2 outline → Fillet4 2 (cut)
    with BuildSketch(Plane(origin=(0, 0, 0), x_dir=(1, 0, 0), z_dir=(0, 0.707106781186714, -0.707106781186381)).offset(FILLET4_START)):
        with BuildLine():
            ThreePointArc((-0.875, -5.604772721), (-1.316941738, -5.421714459), (-1.5, -4.979772721))
            Line((-1.5, -4.979772721), (-1.5, -5.604772721))
            Line((-1.5, -5.604772721), (-0.875, -5.604772721))
        make_face()
        with BuildLine():
            ThreePointArc((1.5, -4.979772721), (1.316941738, -5.421714459), (0.875, -5.604772721))
            Line((0.875, -5.604772721), (1.5, -5.604772721))
            Line((1.5, -5.604772721), (1.5, -4.979772721))
        make_face()
    extrude(amount=FILLET4_2_DEPTH, mode=Mode.SUBTRACT)

    # Sketch25 → Cut-Extrude6 (cut)
    with BuildSketch(Plane(origin=(0, 4.750000000000001, 0), x_dir=(1, 0, 0), z_dir=(0, 1, 0))):
        Polygon((-2.150597413752126, 1.4408106156054146), (2.3120536760458297, 1.4408106156054146), (2.3120536760458292, -3.1035844529903045), (-2.150597413752126, -3.1035844529903045), align=None)
    extrude(amount=CUT_EXTRUDE6_DEPTH, mode=Mode.SUBTRACT)

    # Sketch26 → Cut-Extrude7 (cut)
    with BuildSketch(Plane(origin=(0, 0, 0), x_dir=(-1, 0, 0), z_dir=(0, 0, -1))):
        Polygon((-1.9500000000000004, 1.2500000000000002), (-0.9500000000000003, 1.2500000000000002), (-0.9500000000000002, 0.2500000000000002), (-1.9500000000000002, 0.2500000000000002), align=None)
        Polygon((1.9500000000000004, 1.2500000000000002), (0.9500000000000003, 1.2500000000000002), (0.9500000000000004, 0.25), (1.9500000000000004, 0.2500000000000002), align=None)
    extrude(amount=-CUT_EXTRUDE7_DEPTH, mode=Mode.SUBTRACT)

    # Sketch27 → Boss-Extrude20 (add)
    with BuildSketch(Plane(origin=(0, 0, 0.5), x_dir=(-1, 0, 0), z_dir=(0, 0, -1))):
        Polygon((1.6500000000000004, 0.25000000000000017), (1.9500000000000004, 0.2500000000000002), (1.9500000000000004, 1.2500000000000002), (1.6500000000000004, 1.2500000000000002), align=None)
        Polygon((-1.6500000000000004, 1.2500000000000002), (-1.9500000000000004, 1.2500000000000002), (-1.9500000000000002, 0.2500000000000002), (-1.6500000000000004, 0.2500000000000002), align=None)
    extrude(amount=BOSS_EXTRUDE20_DEPTH)


solid = part.part
